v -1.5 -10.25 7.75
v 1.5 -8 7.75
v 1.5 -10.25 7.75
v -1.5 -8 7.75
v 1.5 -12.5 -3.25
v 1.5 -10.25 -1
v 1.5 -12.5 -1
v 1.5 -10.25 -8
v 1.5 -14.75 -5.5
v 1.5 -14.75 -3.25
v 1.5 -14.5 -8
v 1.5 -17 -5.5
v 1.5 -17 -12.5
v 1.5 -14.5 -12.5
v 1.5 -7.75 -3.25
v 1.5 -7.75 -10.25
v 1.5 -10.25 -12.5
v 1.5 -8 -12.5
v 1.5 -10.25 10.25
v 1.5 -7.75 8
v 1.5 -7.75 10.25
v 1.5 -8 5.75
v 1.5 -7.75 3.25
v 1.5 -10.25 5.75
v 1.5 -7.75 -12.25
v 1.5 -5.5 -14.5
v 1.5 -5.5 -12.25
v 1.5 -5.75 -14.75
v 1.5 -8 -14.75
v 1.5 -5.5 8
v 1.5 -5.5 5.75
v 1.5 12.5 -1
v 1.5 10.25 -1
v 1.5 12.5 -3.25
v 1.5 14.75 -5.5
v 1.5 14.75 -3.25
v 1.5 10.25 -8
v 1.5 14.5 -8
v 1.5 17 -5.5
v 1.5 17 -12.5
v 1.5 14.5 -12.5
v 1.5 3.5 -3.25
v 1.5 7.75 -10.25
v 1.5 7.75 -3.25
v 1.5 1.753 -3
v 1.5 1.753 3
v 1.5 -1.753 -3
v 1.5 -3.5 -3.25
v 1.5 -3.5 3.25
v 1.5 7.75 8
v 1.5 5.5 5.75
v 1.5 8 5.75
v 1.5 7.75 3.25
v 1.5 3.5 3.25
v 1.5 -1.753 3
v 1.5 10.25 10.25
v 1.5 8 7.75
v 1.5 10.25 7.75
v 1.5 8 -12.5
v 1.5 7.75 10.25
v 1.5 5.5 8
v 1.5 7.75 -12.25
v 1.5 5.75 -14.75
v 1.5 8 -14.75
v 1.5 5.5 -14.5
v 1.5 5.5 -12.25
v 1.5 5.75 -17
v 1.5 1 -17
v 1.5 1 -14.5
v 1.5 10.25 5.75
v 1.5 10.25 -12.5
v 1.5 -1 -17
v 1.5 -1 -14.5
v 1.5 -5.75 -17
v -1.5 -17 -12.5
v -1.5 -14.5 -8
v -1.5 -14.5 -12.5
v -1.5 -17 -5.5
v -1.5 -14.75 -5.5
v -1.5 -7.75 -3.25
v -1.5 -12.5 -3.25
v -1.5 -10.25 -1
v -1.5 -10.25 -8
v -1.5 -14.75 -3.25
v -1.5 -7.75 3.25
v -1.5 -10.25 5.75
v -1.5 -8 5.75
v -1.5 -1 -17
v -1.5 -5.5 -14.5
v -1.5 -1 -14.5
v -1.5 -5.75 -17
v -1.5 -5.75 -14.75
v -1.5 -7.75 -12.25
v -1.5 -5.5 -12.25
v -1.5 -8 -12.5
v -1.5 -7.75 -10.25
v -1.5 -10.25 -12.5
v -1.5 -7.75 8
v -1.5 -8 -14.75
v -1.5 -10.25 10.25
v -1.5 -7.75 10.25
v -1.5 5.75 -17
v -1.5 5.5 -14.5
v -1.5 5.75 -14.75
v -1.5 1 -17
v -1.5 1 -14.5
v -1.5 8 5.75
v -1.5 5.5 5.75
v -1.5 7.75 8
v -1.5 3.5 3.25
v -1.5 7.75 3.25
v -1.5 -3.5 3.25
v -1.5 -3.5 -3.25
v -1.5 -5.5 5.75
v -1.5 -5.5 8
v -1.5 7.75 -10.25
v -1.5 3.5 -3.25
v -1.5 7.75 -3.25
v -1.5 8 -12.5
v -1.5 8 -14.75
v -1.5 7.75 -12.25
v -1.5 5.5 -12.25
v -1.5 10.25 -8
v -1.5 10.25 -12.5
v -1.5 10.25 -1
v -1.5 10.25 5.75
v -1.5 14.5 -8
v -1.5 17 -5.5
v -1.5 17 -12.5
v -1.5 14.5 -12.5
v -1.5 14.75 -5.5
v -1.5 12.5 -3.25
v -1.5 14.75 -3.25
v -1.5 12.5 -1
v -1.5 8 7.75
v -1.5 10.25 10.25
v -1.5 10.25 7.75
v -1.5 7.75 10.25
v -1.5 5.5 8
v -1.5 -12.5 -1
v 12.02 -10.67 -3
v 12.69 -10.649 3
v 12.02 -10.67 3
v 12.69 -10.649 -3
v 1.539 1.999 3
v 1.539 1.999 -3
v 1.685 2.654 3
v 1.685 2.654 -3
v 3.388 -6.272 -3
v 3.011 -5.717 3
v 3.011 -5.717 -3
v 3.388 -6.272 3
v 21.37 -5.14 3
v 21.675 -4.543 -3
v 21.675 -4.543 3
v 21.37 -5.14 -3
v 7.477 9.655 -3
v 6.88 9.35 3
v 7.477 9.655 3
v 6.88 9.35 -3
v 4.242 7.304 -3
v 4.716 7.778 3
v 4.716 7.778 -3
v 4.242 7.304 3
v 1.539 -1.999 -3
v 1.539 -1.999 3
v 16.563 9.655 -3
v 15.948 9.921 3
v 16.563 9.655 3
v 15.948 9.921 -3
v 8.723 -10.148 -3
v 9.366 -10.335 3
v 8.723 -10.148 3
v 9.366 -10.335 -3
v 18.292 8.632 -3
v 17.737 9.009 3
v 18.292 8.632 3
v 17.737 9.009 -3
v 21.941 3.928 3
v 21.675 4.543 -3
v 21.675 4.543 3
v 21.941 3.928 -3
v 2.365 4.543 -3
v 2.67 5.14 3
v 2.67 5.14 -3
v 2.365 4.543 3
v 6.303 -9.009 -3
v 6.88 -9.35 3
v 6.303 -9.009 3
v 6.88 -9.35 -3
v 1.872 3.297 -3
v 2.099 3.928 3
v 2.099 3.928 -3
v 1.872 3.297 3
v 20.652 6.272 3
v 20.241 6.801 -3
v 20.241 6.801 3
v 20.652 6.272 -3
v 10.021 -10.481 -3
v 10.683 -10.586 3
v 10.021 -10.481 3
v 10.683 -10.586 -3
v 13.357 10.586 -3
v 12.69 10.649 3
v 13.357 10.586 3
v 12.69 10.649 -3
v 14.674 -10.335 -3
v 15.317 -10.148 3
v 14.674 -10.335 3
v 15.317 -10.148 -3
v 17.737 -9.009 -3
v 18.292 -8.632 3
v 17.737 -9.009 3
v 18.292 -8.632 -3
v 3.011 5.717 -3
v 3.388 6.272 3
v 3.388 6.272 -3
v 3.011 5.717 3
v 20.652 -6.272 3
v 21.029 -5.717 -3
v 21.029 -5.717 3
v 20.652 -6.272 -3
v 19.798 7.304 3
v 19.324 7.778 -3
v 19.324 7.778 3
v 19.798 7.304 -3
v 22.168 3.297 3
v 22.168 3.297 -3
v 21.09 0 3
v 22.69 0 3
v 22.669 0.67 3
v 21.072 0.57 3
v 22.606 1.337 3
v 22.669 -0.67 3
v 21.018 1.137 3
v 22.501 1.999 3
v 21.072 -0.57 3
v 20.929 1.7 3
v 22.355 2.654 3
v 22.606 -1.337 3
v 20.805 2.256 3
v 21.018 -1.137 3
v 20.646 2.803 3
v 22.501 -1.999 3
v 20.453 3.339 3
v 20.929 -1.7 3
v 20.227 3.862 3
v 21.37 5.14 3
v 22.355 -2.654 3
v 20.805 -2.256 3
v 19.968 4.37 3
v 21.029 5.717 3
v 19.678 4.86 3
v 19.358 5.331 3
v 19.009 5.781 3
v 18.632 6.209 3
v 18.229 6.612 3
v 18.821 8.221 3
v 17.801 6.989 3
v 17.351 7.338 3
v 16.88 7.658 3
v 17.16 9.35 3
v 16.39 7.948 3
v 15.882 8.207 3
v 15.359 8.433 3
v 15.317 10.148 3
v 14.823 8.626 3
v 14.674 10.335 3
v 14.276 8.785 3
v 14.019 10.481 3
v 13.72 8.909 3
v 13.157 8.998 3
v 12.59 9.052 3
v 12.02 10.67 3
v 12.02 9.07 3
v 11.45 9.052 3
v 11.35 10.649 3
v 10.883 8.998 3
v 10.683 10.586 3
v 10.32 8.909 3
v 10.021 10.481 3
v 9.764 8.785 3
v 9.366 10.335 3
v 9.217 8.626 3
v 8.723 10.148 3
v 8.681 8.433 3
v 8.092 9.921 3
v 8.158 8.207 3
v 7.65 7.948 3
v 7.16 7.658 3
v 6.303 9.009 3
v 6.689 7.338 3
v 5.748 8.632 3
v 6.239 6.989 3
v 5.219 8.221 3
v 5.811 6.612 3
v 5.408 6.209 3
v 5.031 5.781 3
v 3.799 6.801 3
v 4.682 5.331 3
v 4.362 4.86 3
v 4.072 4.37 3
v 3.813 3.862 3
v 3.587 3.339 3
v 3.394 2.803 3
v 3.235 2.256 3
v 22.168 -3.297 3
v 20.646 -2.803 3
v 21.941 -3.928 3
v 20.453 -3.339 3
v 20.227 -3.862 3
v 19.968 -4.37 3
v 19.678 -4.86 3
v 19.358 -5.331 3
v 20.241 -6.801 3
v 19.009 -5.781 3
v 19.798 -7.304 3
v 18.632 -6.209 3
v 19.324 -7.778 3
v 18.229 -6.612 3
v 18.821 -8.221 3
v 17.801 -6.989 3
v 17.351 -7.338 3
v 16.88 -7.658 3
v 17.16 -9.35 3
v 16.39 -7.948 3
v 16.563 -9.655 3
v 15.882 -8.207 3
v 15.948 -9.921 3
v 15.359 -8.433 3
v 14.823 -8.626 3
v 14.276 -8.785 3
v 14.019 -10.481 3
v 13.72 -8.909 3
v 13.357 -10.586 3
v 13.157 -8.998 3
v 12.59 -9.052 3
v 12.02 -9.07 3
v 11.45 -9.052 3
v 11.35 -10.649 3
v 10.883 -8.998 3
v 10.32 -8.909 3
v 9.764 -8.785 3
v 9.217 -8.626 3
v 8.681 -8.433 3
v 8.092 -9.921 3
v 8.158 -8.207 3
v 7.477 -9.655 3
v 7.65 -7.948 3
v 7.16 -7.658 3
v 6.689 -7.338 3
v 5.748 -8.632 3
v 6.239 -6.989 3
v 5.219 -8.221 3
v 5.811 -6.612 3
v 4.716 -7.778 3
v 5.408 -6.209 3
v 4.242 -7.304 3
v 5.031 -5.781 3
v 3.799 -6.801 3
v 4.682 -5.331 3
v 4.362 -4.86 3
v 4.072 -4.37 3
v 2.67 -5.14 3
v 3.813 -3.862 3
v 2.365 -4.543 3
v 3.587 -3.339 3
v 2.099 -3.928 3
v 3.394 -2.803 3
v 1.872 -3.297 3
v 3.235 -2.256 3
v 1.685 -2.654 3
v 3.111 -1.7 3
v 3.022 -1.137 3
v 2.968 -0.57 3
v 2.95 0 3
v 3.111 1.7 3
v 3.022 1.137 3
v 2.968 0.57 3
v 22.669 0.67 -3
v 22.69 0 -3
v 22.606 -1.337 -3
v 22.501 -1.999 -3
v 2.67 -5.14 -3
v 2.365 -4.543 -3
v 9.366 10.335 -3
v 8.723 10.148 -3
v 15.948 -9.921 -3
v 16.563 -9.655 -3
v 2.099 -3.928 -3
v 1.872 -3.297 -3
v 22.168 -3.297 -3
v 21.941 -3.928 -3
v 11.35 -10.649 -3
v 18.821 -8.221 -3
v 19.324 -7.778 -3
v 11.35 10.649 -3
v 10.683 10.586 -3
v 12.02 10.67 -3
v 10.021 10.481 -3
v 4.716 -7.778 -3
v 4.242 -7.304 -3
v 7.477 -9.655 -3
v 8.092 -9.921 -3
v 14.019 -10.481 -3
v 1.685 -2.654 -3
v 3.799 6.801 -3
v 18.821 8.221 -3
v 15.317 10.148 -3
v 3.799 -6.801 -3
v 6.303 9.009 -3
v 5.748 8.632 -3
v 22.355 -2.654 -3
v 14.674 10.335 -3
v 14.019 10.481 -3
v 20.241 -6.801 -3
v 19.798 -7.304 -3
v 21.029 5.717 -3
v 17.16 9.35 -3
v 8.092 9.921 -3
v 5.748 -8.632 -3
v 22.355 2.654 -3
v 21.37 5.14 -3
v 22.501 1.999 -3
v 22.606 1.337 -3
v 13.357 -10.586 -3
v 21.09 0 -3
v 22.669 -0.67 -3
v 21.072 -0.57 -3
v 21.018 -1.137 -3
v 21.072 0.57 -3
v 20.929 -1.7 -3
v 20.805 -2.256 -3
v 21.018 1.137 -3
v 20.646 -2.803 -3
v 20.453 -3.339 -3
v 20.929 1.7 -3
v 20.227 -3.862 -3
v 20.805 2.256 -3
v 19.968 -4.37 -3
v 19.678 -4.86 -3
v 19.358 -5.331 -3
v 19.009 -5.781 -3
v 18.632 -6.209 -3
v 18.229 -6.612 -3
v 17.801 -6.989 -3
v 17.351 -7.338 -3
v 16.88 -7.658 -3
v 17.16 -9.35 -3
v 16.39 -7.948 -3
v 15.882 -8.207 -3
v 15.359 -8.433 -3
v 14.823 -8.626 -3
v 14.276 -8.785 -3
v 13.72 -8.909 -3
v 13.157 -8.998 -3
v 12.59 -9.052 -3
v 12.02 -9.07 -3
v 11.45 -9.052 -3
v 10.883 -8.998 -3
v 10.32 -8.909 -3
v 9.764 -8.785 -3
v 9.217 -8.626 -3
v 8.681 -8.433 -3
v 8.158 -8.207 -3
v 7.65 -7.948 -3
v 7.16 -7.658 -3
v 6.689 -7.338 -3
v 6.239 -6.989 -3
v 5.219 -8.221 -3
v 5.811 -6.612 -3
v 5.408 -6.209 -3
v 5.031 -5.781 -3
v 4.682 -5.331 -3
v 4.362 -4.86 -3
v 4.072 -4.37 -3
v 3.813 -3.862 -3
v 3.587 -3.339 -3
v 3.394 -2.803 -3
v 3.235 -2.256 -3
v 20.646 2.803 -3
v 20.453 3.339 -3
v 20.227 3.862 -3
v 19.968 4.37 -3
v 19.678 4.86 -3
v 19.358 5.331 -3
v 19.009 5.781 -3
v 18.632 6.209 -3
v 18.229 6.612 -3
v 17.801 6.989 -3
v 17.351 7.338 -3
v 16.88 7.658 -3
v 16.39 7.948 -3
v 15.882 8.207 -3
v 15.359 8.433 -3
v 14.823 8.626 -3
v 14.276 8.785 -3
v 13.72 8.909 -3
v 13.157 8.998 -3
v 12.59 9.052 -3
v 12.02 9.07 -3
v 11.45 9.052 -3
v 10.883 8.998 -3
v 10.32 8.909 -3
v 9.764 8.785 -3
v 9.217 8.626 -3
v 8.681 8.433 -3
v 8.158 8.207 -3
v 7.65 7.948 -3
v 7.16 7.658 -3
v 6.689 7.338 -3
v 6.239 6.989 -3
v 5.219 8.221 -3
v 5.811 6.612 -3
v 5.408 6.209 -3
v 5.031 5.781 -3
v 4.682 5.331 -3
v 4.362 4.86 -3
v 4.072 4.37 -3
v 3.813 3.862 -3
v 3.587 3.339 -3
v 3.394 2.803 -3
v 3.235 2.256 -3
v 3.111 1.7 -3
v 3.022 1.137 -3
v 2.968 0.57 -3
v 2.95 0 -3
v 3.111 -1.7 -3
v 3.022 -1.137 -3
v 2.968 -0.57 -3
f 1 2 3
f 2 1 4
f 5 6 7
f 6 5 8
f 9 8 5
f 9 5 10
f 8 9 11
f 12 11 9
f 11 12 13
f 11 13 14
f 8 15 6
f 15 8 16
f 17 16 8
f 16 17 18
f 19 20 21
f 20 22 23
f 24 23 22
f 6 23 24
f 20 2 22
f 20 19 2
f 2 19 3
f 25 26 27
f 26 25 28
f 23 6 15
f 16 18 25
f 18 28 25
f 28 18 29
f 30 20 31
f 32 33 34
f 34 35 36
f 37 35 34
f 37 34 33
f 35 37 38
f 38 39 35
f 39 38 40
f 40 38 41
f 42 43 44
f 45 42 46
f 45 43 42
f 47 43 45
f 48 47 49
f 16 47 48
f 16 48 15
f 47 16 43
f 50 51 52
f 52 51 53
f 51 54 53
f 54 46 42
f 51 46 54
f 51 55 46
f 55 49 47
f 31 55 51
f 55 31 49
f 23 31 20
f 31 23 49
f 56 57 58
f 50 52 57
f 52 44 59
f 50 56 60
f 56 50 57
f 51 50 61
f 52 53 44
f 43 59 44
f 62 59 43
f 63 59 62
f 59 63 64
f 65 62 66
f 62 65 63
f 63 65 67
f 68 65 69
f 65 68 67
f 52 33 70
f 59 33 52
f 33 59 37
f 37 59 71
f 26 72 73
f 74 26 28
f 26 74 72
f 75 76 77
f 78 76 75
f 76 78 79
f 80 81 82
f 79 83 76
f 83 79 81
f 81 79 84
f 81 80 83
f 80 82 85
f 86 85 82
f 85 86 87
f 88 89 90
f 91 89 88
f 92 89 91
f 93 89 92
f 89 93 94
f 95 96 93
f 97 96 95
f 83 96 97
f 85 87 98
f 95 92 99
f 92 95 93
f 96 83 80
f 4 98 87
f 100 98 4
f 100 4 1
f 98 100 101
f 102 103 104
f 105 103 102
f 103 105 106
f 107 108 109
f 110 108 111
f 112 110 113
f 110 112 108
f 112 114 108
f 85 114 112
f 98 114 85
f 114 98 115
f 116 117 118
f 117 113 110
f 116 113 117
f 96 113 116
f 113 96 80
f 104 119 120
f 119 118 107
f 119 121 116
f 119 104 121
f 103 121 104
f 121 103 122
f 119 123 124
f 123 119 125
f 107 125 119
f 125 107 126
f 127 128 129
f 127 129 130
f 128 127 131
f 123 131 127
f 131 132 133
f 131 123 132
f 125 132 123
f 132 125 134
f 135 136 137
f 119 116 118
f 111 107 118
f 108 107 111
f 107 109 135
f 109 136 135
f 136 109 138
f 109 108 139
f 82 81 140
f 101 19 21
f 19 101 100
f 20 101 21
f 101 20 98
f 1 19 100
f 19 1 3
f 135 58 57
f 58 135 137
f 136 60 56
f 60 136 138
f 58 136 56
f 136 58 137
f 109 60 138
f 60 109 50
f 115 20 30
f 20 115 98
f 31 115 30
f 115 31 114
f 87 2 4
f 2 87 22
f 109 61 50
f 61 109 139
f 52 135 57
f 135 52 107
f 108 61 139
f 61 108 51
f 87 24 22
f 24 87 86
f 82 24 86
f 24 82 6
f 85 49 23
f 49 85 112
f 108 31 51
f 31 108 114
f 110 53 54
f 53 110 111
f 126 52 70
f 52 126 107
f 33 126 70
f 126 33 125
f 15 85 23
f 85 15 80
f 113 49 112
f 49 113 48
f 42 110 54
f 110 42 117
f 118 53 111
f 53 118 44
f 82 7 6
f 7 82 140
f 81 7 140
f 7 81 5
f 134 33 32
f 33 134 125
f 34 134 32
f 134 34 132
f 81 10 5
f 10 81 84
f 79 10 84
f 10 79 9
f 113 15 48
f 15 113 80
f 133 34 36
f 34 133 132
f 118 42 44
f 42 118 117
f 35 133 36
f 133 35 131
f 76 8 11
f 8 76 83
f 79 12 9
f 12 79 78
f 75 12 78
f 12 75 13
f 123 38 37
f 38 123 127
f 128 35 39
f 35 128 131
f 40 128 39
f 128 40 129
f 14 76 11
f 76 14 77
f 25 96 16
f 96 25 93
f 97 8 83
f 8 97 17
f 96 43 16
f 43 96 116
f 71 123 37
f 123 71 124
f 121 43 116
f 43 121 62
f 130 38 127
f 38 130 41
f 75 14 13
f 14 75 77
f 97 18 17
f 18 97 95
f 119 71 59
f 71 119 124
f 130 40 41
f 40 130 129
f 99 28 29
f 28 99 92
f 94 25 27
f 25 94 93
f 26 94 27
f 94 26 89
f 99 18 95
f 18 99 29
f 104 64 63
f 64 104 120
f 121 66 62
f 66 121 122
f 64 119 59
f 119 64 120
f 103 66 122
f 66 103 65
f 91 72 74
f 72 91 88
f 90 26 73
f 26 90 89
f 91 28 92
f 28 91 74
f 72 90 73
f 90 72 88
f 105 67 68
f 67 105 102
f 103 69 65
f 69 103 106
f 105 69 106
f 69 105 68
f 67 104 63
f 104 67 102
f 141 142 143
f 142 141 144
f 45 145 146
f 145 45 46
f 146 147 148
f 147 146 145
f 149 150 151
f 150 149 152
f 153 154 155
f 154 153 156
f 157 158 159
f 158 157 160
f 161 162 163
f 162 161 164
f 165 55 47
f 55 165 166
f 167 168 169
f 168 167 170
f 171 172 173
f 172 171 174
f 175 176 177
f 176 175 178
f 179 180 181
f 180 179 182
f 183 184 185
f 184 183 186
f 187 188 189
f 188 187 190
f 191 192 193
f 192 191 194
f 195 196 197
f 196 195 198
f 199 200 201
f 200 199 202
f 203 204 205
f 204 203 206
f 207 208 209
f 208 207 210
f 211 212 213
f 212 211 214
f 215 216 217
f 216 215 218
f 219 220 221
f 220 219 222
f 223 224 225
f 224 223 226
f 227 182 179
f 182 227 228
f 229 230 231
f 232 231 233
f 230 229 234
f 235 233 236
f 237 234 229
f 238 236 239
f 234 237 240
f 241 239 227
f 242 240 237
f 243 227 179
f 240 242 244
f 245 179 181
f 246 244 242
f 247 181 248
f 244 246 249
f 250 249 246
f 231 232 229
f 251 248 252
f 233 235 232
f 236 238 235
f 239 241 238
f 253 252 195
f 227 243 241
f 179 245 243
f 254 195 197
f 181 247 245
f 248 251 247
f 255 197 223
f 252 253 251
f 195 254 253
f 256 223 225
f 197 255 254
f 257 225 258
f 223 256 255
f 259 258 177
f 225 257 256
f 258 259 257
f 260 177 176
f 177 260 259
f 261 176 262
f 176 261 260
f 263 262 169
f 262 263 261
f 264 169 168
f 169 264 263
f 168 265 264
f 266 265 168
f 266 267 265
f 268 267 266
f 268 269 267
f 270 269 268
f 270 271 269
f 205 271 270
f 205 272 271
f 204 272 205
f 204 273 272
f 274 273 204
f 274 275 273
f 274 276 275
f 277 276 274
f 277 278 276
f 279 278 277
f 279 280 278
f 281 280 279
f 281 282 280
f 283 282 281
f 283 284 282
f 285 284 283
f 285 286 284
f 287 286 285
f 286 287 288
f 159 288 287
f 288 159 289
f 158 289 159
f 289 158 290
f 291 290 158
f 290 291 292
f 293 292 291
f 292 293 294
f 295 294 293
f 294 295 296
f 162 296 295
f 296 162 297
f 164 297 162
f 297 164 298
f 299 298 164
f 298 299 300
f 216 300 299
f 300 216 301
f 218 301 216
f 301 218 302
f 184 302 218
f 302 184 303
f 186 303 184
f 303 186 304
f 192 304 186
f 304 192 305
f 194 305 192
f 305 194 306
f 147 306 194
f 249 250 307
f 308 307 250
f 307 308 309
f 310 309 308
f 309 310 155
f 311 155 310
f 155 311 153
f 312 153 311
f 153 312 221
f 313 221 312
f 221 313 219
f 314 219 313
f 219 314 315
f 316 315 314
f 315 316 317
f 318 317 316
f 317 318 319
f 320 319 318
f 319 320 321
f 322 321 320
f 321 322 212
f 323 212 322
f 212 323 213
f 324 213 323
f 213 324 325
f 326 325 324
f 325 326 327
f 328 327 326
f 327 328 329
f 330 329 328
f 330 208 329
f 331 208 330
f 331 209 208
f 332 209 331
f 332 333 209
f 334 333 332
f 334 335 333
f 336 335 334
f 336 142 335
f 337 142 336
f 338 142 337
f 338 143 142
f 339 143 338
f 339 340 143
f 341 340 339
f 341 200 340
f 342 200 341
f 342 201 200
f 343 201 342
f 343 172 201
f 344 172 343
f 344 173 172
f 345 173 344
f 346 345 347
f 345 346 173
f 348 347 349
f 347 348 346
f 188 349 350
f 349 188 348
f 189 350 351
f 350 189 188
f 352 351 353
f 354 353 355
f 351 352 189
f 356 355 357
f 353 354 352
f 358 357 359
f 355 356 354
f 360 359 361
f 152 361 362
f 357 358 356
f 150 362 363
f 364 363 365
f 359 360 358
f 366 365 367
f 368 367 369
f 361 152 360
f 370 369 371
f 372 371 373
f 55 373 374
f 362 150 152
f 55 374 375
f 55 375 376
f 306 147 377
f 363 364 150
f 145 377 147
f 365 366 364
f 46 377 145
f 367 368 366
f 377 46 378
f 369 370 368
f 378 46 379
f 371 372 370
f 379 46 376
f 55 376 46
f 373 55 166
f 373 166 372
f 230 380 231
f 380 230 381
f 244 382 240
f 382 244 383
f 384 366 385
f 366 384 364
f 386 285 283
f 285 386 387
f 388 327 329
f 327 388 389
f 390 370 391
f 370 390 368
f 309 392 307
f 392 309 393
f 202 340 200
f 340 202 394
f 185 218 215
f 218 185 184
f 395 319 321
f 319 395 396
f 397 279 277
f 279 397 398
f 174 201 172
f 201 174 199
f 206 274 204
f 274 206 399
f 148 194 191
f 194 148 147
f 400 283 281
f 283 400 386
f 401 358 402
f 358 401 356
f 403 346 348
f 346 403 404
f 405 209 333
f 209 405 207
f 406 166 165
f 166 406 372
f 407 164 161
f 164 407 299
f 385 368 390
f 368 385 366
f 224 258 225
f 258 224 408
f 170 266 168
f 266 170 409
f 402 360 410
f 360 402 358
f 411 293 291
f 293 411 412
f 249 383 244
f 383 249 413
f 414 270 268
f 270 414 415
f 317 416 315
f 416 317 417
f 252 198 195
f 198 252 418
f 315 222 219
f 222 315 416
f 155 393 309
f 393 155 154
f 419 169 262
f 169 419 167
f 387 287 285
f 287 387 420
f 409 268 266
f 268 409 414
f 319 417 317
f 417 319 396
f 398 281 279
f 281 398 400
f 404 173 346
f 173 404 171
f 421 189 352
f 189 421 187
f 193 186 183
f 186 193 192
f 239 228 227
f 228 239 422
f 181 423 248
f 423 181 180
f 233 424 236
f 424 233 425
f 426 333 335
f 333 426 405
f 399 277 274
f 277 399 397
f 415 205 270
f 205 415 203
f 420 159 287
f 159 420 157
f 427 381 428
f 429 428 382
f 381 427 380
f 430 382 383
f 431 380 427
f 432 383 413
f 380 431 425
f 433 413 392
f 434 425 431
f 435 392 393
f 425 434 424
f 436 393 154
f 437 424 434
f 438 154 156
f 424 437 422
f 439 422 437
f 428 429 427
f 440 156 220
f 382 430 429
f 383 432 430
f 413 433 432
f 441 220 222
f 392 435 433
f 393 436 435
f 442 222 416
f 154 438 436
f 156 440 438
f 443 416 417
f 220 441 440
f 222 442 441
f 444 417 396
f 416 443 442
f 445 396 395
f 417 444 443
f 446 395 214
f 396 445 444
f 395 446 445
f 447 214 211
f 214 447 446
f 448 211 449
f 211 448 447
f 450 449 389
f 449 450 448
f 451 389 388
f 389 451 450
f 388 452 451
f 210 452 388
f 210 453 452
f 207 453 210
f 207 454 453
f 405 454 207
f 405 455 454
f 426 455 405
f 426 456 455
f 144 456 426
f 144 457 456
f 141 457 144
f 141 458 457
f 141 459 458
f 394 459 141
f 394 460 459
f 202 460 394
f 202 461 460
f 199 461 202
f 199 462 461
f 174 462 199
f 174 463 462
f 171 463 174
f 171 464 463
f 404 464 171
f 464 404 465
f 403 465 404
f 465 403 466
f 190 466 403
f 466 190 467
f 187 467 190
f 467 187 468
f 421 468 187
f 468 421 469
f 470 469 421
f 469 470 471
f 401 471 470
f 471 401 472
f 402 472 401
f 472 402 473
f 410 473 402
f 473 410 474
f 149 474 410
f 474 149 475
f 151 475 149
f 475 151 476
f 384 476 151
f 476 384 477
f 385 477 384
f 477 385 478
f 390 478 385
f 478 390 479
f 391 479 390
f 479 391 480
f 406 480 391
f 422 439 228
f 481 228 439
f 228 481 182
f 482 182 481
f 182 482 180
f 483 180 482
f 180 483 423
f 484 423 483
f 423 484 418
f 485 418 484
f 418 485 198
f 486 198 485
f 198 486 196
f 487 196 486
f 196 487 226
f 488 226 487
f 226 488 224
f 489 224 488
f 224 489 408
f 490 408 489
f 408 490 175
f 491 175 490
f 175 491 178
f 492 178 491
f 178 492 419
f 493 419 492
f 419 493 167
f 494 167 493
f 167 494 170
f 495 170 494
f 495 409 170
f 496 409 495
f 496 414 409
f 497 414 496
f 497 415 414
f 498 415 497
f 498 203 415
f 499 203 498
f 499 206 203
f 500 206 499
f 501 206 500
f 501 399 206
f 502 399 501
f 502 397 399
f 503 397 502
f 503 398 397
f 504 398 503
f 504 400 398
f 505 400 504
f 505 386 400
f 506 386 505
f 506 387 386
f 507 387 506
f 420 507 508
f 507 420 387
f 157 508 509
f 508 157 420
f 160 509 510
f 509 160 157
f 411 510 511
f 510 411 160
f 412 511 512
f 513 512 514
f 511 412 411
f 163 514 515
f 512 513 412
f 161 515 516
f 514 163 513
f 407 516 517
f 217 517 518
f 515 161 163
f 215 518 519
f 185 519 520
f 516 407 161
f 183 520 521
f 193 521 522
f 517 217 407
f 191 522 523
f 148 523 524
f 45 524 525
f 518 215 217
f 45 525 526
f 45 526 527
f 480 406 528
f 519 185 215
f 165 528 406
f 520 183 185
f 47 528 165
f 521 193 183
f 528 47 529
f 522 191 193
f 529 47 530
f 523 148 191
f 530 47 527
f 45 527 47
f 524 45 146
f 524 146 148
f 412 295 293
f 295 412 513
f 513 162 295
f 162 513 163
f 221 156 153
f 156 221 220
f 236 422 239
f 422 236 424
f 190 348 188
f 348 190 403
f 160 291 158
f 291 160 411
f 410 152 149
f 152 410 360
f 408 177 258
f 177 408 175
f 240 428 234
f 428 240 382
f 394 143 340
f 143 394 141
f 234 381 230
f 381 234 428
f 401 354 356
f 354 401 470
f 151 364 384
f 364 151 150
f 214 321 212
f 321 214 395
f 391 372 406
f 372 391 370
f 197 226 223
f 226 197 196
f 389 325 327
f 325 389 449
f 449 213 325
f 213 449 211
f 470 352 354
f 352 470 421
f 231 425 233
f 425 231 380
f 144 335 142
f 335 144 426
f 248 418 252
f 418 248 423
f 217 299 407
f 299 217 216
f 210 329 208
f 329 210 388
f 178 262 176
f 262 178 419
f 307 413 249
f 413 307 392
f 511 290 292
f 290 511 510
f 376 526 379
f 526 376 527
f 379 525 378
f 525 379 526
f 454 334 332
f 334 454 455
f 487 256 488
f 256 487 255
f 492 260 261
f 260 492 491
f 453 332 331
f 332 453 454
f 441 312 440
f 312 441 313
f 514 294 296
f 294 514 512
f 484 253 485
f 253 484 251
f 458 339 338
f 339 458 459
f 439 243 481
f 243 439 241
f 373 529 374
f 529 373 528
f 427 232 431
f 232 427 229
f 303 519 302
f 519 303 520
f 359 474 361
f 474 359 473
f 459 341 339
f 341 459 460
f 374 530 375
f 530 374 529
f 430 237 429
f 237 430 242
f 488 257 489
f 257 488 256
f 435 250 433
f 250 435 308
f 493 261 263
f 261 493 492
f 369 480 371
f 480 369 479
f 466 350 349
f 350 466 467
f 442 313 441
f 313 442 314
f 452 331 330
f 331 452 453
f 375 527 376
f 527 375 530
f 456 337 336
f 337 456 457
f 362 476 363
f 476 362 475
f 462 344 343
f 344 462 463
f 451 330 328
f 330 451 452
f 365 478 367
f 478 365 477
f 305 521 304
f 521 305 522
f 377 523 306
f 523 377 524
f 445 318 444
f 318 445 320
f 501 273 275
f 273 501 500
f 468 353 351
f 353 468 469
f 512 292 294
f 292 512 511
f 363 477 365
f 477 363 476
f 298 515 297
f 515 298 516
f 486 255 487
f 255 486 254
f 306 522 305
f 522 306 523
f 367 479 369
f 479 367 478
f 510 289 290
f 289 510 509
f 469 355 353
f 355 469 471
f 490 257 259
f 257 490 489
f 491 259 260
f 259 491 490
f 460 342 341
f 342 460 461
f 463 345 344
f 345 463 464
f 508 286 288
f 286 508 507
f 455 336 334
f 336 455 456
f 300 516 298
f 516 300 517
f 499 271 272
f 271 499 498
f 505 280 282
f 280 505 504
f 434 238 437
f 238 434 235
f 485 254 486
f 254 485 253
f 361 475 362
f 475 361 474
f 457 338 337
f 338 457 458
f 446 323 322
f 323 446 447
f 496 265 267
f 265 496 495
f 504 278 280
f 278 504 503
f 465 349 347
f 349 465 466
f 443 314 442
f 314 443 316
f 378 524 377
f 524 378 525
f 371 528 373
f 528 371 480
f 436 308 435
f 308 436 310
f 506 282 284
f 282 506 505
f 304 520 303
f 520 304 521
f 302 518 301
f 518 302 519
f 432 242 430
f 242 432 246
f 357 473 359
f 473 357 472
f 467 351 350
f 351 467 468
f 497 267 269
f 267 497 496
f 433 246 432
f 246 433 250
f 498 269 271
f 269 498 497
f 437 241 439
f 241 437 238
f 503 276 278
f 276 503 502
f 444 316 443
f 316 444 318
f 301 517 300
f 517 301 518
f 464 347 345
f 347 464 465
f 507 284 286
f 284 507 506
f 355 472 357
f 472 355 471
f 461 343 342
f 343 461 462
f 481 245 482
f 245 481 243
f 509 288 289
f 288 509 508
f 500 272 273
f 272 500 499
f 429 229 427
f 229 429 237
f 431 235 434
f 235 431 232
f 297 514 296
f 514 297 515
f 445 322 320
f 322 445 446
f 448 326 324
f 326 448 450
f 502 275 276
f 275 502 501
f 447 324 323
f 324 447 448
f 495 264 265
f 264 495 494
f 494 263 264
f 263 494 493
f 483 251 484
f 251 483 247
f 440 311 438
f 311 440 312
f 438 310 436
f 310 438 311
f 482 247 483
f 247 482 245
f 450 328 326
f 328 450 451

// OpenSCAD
//preview[view:west, tilt:side]
ring_thickness = 1.6; //[0.8:Thin,1.6:Normal,2.4:Thick]
ring_width = 6; //[6:12]
shape = 3; //[0:Custom,1:SpaceShip,2:Alien1,3:Alien2,4:Heart,5:Bow,6:Mushroom,7:Skull,8:WaitCursor,9:Pacman1,10:Pacman2]
//You can enter you own shape array here:
Custom = "[[0,0,0]]";
//Size of the pixel art object
objectSize = 50;
//Thickness of the pixel art object
objectThickness = 3;
gridRows = 2 * 10; //can't find a better to to get the customizer to ignore it 

//Pixel Width
unitWidth = objectSize / gridRows;


unitLength = unitWidth;
distance = unitWidth;

//(US Ring Sizes)
ring_size = 18.14; //[11.63:0,11.84:0.25,12.04:0.5,12.24:0.75,12.45:1,12.65:1.25,12.85:1.5,13.06:1.75,13.26:2,13.46:2.25,13.67:2.5,13.87:2.75,14.07:3,14.27:3.25,14.48:3.5,14.68:3.75,14.88:4,15.09:4.25,15.29:4.5,15.49:4.75,2215.9:5.25,16.1:5.5,16.31:5.75,16.51:6,16.71:6.25,16.92:6.5,17.12:6.75,17.32:7,17.53:7.25,17.73:7.5,17.93:7.75,18.14:8,18.34:8.25,18.54:8.5,18.75:8.75,18.95:9,19.15:9.25,19.35:9.5,19.56:9.75,19.76:10,19.96:10.25,20.17:10.5,20.37:10.75,20.57:11,20.78:11.25,20.98:11.5,21.18:11.75,21.39:12,21.59:12.25,21.79:12.5,22:12.75,22.2:13,22.4:13.25,22.61:13.5,22.81:13.75,23.01:14,23.22:14.25,23.42:14.5,23.62:14.75,23.83:15,24.03:15.25,24.23:15.5,24.43:15.75,24.64:16]


//Shapes

SpaceShip1 = [
    [-5, -3, 0],
    [-5, 3, 0],
    [-4, -2, 0],
    [-4, 2, 0],
    [-3, -1, 0],
    [-3, 0, 0],
    [-3, 1, 0],
    [-2, -2, 0],
    [-2, -1, 0],
    [-2, 0, 0],
    [-2, 1, 0],
    [-2, 2, 0],
    [-1, -3, 0],
    [-1, -2, 0],
    [-1, -1, 0],
    [-1, 0, 0],
    [-1, 1, 0],
    [-1, 2, 0],
    [-1, 3, 0],
    [0, -5, 0],
    [0, -4, 0],
    [0, -3, 0],
    [0, -1, 0],
    [0, 1, 0],
    [0, 3, 0],
    [0, 4, 0],
    [0, 5, 0],
    [1, -3, 0],
    [1, -2, 0],
    [1, -1, 0],
    [1, 0, 0],
    [1, 1, 0],
    [1, 2, 0],
    [1, 3, 0],
    [2, -2, 0],
    [2, -1, 0],
    [2, 0, 0],
    [2, 1, 0],
    [2, 2, 0],
    [3, -1, 0],
    [3, 0, 0],
    [3, 1, 0],
    [4, -2, 0],
    [4, 2, 0],
    [5, -3, 0],
    [5, 3, 0]
];

Alien1 = [
    [-6, -2, 0],
    [-6, -1, 0],
    [-6, 0, 0],
    [-6, 1, 0],
    [-6, 2, 0],
    [-5, -2, 0],
    [-5, 0, 0],
    [-5, 2, 0],
    [-4, -2, 0],
    [-4, -1, 0],
    [-4, 0, 0],
    [-4, 1, 0],
    [-4, 2, 0],
    [-3, 0, 0],
    [-2, -3, 0],
    [-2, -2, 0],
    [-2, -1, 0],
    [-2, 0, 0],
    [-2, 1, 0],
    [-2, 2, 0],
    [-2, 3, 0],
    [-1, -4, 0],
    [-1, -3, 0],
    [-1, -1, 0],
    [-1, 0, 0],
    [-1, 1, 0],
    [-1, 3, 0],
    [-1, 4, 0],
    [0, -4, 0],
    [0, -1, 0],
    [0, 0, 0],
    [0, 1, 0],
    [0, 4, 0],
    [1, -5, 0],
    [1, -4, 0],
    [1, -1, 0],
    [1, 0, 0],
    [1, 1, 0],
    [1, 4, 0],
    [1, 5, 0],
    [2, -5, 0],
    [2, -1, 0],
    [2, 0, 0],
    [2, 1, 0],
    [2, 5, 0],
    [3, -1, 0],
    [3, 0, 0],
    [3, 1, 0],
    [4, -3, 0],
    [4, -2, 0],
    [4, -1, 0],
    [4, 0, 0],
    [4, 1, 0],
    [4, 2, 0],
    [4, 3, 0],
    [5, -3, 0],
    [5, 3, 0],
    [6, -3, 0],
    [6, 3, 0],
    [7, -5, 0],
    [7, -4, 0],
    [7, -3, 0],
    [7, 3, 0],
    [7, 4, 0],
    [7, 5, 0]
];

Alien2 = [
    [-4, -4, 0],
    [-4, 4, 0],
    [-3, -3, 0],
    [-3, 3, 0],
    [-2, -4, 0],
    [-2, -3, 0],
    [-2, -2, 0],
    [-2, -1, 0],
    [-2, 0, 0],
    [-2, 1, 0],
    [-2, 2, 0],
    [-2, 3, 0],
    [-2, 4, 0],
    [-1, -4, 0],
    [-1, -1, 0],
    [-1, 0, 0],
    [-1, 1, 0],
    [-1, 4, 0],
    [0, -4, 0],
    [0, -1, 0],
    [0, 0, 0],
    [0, 1, 0],
    [0, 4, 0],
    [1, -5, 0],
    [1, -4, 0],
    [1, -1, 0],
    [1, 0, 0],
    [1, 1, 0],
    [1, 4, 0],
    [1, 5, 0],
    [2, -6, 0],
    [2, -5, 0],
    [2, -4, 0],
    [2, -3, 0],
    [2, -2, 0],
    [2, -1, 0],
    [2, 0, 0],
    [2, 1, 0],
    [2, 2, 0],
    [2, 3, 0],
    [2, 4, 0],
    [2, 5, 0],
    [2, 6, 0],
    [3, -7, 0],
    [3, -6, 0],
    [3, -5, 0],
    [3, -4, 0],
    [3, -3, 0],
    [3, -2, 0],
    [3, -1, 0],
    [3, 0, 0],
    [3, 1, 0],
    [3, 2, 0],
    [3, 3, 0],
    [3, 4, 0],
    [3, 5, 0],
    [3, 6, 0],
    [3, 7, 0],
    [4, -7, 0],
    [4, -4, 0],
    [4, -3, 0],
    [4, -2, 0],
    [4, -1, 0],
    [4, 0, 0],
    [4, 1, 0],
    [4, 2, 0],
    [4, 3, 0],
    [4, 4, 0],
    [4, 7, 0],
    [5, -7, 0],
    [5, -4, 0],
    [5, 4, 0],
    [5, 7, 0],
    [6, -3, 0],
    [6, 3, 0],
    [7, -2, 0],
    [7, -1, 0],
    [7, 1, 0],
    [7, 2, 0]
];


Heart = [
    [-2, -4, 0],
    [-2, -3, 0],
    [-2, -2, 0],
    [-2, 2, 0],
    [-2, 3, 0],
    [-2, 4, 0],
    [-1, -5, 0],
    [-1, -4, 0],
    [-1, -2, 0],
    [-1, -1, 0],
    [-1, 1, 0],
    [-1, 2, 0],
    [-1, 3, 0],
    [-1, 4, 0],
    [-1, 5, 0],
    [0, -5, 0],
    [0, -3, 0],
    [0, -2, 0],
    [0, -1, 0],
    [0, 0, 0],
    [0, 1, 0],
    [0, 2, 0],
    [0, 3, 0],
    [0, 4, 0],
    [0, 5, 0],
    [1, -5, 0],
    [1, -3, 0],
    [1, -2, 0],
    [1, -1, 0],
    [1, 0, 0],
    [1, 1, 0],
    [1, 2, 0],
    [1, 3, 0],
    [1, 4, 0],
    [1, 5, 0],
    [2, -5, 0],
    [2, -4, 0],
    [2, -3, 0],
    [2, -2, 0],
    [2, -1, 0],
    [2, 0, 0],
    [2, 1, 0],
    [2, 2, 0],
    [2, 3, 0],
    [2, 4, 0],
    [2, 5, 0],
    [3, -4, 0],
    [3, -3, 0],
    [3, -2, 0],
    [3, -1, 0],
    [3, 0, 0],
    [3, 1, 0],
    [3, 2, 0],
    [3, 3, 0],
    [3, 4, 0],
    [4, -3, 0],
    [4, -2, 0],
    [4, -1, 0],
    [4, 0, 0],
    [4, 1, 0],
    [4, 2, 0],
    [4, 3, 0],
    [5, -2, 0],
    [5, -1, 0],
    [5, 0, 0],
    [5, 1, 0],
    [5, 2, 0],
    [6, -1, 0],
    [6, 0, 0],
    [6, 1, 0],
    [7, 0, 0]
];

Mushroom1 = [
    [-9, -2, 0],
    [-9, -1, 0],
    [-9, 0, 0],
    [-9, 1, 0],
    [-9, 2, 0],
    [-9, 3, 0],
    [-8, -4, 0],
    [-8, -3, 0],
    [-8, -2, 0],
    [-8, -1, 0],
    [-8, 2, 0],
    [-8, 3, 0],
    [-8, 4, 0],
    [-8, 5, 0],
    [-7, -5, 0],
    [-7, -4, 0],
    [-7, -3, 0],
    [-7, -2, 0],
    [-7, -1, 0],
    [-7, 2, 0],
    [-7, 3, 0],
    [-7, 4, 0],
    [-7, 5, 0],
    [-7, 6, 0],
    [-6, -6, 0],
    [-6, -5, 0],
    [-6, -3, 0],
    [-6, -2, 0],
    [-6, 3, 0],
    [-6, 4, 0],
    [-6, 6, 0],
    [-6, 7, 0],
    [-5, -6, 0],
    [-5, 7, 0],
    [-4, -7, 0],
    [-4, -6, 0],
    [-4, -5, 0],
    [-4, 6, 0],
    [-4, 7, 0],
    [-4, 8, 0],
    [-3, -7, 0],
    [-3, -6, 0],
    [-3, -5, 0],
    [-3, -4, 0],
    [-3, 5, 0],
    [-3, 6, 0],
    [-3, 7, 0],
    [-3, 8, 0],
    [-2, -7, 0],
    [-2, -6, 0],
    [-2, -5, 0],
    [-2, -4, 0],
    [-2, -1, 0],
    [-2, 0, 0],
    [-2, 1, 0],
    [-2, 2, 0],
    [-2, 5, 0],
    [-2, 6, 0],
    [-2, 7, 0],
    [-2, 8, 0],
    [-1, -7, 0],
    [-1, -6, 0],
    [-1, -5, 0],
    [-1, -1, 0],
    [-1, 0, 0],
    [-1, 1, 0],
    [-1, 2, 0],
    [-1, 6, 0],
    [-1, 7, 0],
    [-1, 8, 0],
    [0, -7, 0],
    [0, -6, 0],
    [0, -5, 0],
    [0, -2, 0],
    [0, -1, 0],
    [0, 0, 0],
    [0, 1, 0],
    [0, 2, 0],
    [0, 3, 0],
    [0, 6, 0],
    [0, 7, 0],
    [0, 8, 0],
    [1, -7, 0],
    [1, -1, 0],
    [1, 0, 0],
    [1, 1, 0],
    [1, 2, 0],
    [1, 8, 0],
    [2, -7, 0],
    [2, -4, 0],
    [2, -3, 0],
    [2, -2, 0],
    [2, -1, 0],
    [2, 0, 0],
    [2, 1, 0],
    [2, 2, 0],
    [2, 3, 0],
    [2, 4, 0],
    [2, 5, 0],
    [2, 8, 0],
    [3, -7, 0],
    [3, -4, 0],
    [3, -1, 0],
    [3, 2, 0],
    [3, 5, 0],
    [3, 8, 0],
    [4, -7, 0],
    [4, -6, 0],
    [4, -5, 0],
    [4, -1, 0],
    [4, 2, 0],
    [4, 6, 0],
    [4, 7, 0],
    [4, 8, 0],
    [5, -6, 0],
    [5, -5, 0],
    [5, 6, 0],
    [5, 7, 0],
    [6, -5, 0],
    [6, 6, 0],
    [7, -5, 0],
    [7, -4, 0],
    [7, 5, 0],
    [7, 6, 0],
    [8, -4, 0],
    [8, -3, 0],
    [8, -2, 0],
    [8, -1, 0],
    [8, 0, 0],
    [8, 1, 0],
    [8, 2, 0],
    [8, 3, 0],
    [8, 4, 0],
    [8, 5, 0]
];;

Mushroom2 = [
    [-7, -2, 0],
    [-7, -1, 0],
    [-7, 0, 0],
    [-7, 1, 0],
    [-7, 2, 0],
    [-7, 3, 0],
    [-6, -4, 0],
    [-6, -3, 0],
    [-6, 4, 0],
    [-6, 5, 0],
    [-5, -5, 0],
    [-5, -4, 0],
    [-5, -3, 0],
    [-5, 4, 0],
    [-5, 5, 0],
    [-5, 6, 0],
    [-4, -6, 0],
    [-4, -5, 0],
    [-4, 6, 0],
    [-4, 7, 0],
    [-3, -6, 0],
    [-3, -5, 0],
    [-3, 6, 0],
    [-3, 7, 0],
    [-2, -7, 0],
    [-2, -6, 0],
    [-2, -5, 0],
    [-2, -4, 0],
    [-2, -1, 0],
    [-2, 0, 0],
    [-2, 1, 0],
    [-2, 2, 0],
    [-2, 5, 0],
    [-2, 6, 0],
    [-2, 7, 0],
    [-2, 8, 0],
    [-1, -7, 0],
    [-1, -6, 0],
    [-1, -5, 0],
    [-1, -4, 0],
    [-1, -2, 0],
    [-1, -1, 0],
    [-1, 0, 0],
    [-1, 1, 0],
    [-1, 2, 0],
    [-1, 3, 0],
    [-1, 5, 0],
    [-1, 6, 0],
    [-1, 7, 0],
    [-1, 8, 0],
    [0, -7, 0],
    [0, -2, 0],
    [0, -1, 0],
    [0, 0, 0],
    [0, 1, 0],
    [0, 2, 0],
    [0, 3, 0],
    [0, 6, 0],
    [0, 7, 0],
    [0, 8, 0],
    [1, -7, 0],
    [1, -1, 0],
    [1, 0, 0],
    [1, 1, 0],
    [1, 2, 0],
    [1, 8, 0],
    [2, -7, 0],
    [2, -4, 0],
    [2, -3, 0],
    [2, -2, 0],
    [2, -1, 0],
    [2, 0, 0],
    [2, 1, 0],
    [2, 2, 0],
    [2, 3, 0],
    [2, 4, 0],
    [2, 5, 0],
    [2, 8, 0],
    [3, -7, 0],
    [3, -4, 0],
    [3, -1, 0],
    [3, 2, 0],
    [3, 5, 0],
    [3, 8, 0],
    [4, -7, 0],
    [4, -6, 0],
    [4, -5, 0],
    [4, -4, 0],
    [4, -1, 0],
    [4, 2, 0],
    [4, 5, 0],
    [4, 6, 0],
    [4, 7, 0],
    [4, 8, 0],
    [5, -6, 0],
    [5, -5, 0],
    [5, 6, 0],
    [5, 7, 0],
    [6, -5, 0],
    [6, 6, 0],
    [7, -5, 0],
    [7, -4, 0],
    [7, 5, 0],
    [7, 6, 0],
    [8, -4, 0],
    [8, -3, 0],
    [8, -2, 0],
    [8, -1, 0],
    [8, 0, 0],
    [8, 1, 0],
    [8, 2, 0],
    [8, 3, 0],
    [8, 4, 0],
    [8, 5, 0]
];


Skull1 = [
    [-4, -3, 0],
    [-4, -2, 0],
    [-4, -1, 0],
    [-4, 0, 0],
    [-4, 1, 0],
    [-4, 2, 0],
    [-4, 3, 0],
    [-3, -4, 0],
    [-3, -3, 0],
    [-3, -2, 0],
    [-3, -1, 0],
    [-3, 0, 0],
    [-3, 1, 0],
    [-3, 2, 0],
    [-3, 3, 0],
    [-3, 4, 0],
    [-2, -5, 0],
    [-2, -4, 0],
    [-2, -3, 0],
    [-2, -2, 0],
    [-2, -1, 0],
    [-2, 0, 0],
    [-2, 1, 0],
    [-2, 2, 0],
    [-2, 3, 0],
    [-2, 4, 0],
    [-2, 5, 0],
    [-1, -5, 0],
    [-1, -4, 0],
    [-1, 0, 0],
    [-1, 4, 0],
    [-1, 5, 0],
    [0, -5, 0],
    [0, -4, 0],
    [0, 0, 0],
    [0, 4, 0],
    [0, 5, 0],
    [1, -5, 0],
    [1, -4, 0],
    [1, 0, 0],
    [1, 4, 0],
    [1, 5, 0],
    [2, -5, 0],
    [2, -4, 0],
    [2, -3, 0],
    [2, -2, 0],
    [2, -1, 0],
    [2, 0, 0],
    [2, 1, 0],
    [2, 2, 0],
    [2, 3, 0],
    [2, 4, 0],
    [2, 5, 0],
    [3, -4, 0],
    [3, -3, 0],
    [3, -1, 0],
    [3, 1, 0],
    [3, 3, 0],
    [3, 4, 0],
    [4, -3, 0],
    [4, -1, 0],
    [4, 1, 0],
    [4, 3, 0],
    [5, -3, 0],
    [5, -1, 0],
    [5, 1, 0],
    [5, 3, 0],
    [6, -3, 0],
    [6, -1, 0],
    [6, 1, 0],
    [6, 3, 0],
    [7, -3, 0],
    [7, -2, 0],
    [7, -1, 0],
    [7, 0, 0],
    [7, 1, 0],
    [7, 2, 0],
    [7, 3, 0]
];


Wait1 = [
    [-10, -5, 0],
    [-10, -4, 0],
    [-10, -3, 0],
    [-10, -2, 0],
    [-10, -1, 0],
    [-10, 0, 0],
    [-10, 1, 0],
    [-10, 2, 0],
    [-10, 3, 0],
    [-10, 4, 0],
    [-10, 5, 0],
    [-9, -5, 0],
    [-9, 5, 0],
    [-8, -5, 0],
    [-8, -4, 0],
    [-8, -3, 0],
    [-8, -2, 0],
    [-8, -1, 0],
    [-8, 0, 0],
    [-8, 1, 0],
    [-8, 2, 0],
    [-8, 3, 0],
    [-8, 4, 0],
    [-8, 5, 0],
    [-7, -4, 0],
    [-7, 4, 0],
    [-6, -4, 0],
    [-6, -2, 0],
    [-6, 0, 0],
    [-6, 2, 0],
    [-6, 4, 0],
    [-5, -4, 0],
    [-5, -1, 0],
    [-5, 1, 0],
    [-5, 4, 0],
    [-4, -4, 0],
    [-4, 0, 0],
    [-4, 4, 0],
    [-3, -4, 0],
    [-3, 4, 0],
    [-2, -3, 0],
    [-2, -2, 0],
    [-2, 0, 0],
    [-2, 2, 0],
    [-2, 3, 0],
    [-1, -2, 0],
    [-1, -1, 0],
    [-1, 1, 0],
    [-1, 2, 0],
    [0, -1, 0],
    [0, 1, 0],
    [1, -2, 0],
    [1, -1, 0],
    [1, 1, 0],
    [1, 2, 0],
    [2, -3, 0],
    [2, -2, 0],
    [2, 0, 0],
    [2, 2, 0],
    [2, 3, 0],
    [3, -4, 0],
    [3, 4, 0],
    [4, -4, 0],
    [4, 0, 0],
    [4, 4, 0],
    [5, -4, 0],
    [5, -1, 0],
    [5, 1, 0],
    [5, 4, 0],
    [6, -4, 0],
    [6, -2, 0],
    [6, 0, 0],
    [6, 2, 0],
    [6, 4, 0],
    [7, -5, 0],
    [7, -4, 0],
    [7, -3, 0],
    [7, -2, 0],
    [7, -1, 0],
    [7, 0, 0],
    [7, 1, 0],
    [7, 2, 0],
    [7, 3, 0],
    [7, 4, 0],
    [7, 5, 0],
    [8, -5, 0],
    [8, 5, 0],
    [9, -5, 0],
    [9, -4, 0],
    [9, -3, 0],
    [9, -2, 0],
    [9, -1, 0],
    [9, 0, 0],
    [9, 1, 0],
    [9, 2, 0],
    [9, 3, 0],
    [9, 4, 0],
    [9, 5, 0]
];

Pacman1 = [
    [-6, -2, 0],
    [-6, -1, 0],
    [-6, 0, 0],
    [-6, 1, 0],
    [-6, 2, 0],
    [-5, -4, 0],
    [-5, -3, 0],
    [-5, -2, 0],
    [-5, -1, 0],
    [-5, 0, 0],
    [-5, 1, 0],
    [-5, 2, 0],
    [-5, 3, 0],
    [-5, 4, 0],
    [-4, -5, 0],
    [-4, -4, 0],
    [-4, -3, 0],
    [-4, -2, 0],
    [-4, -1, 0],
    [-4, 0, 0],
    [-4, 1, 0],
    [-4, 2, 0],
    [-4, 3, 0],
    [-4, 4, 0],
    [-4, 5, 0],
    [-3, -5, 0],
    [-3, -4, 0],
    [-3, -3, 0],
    [-3, -2, 0],
    [-3, -1, 0],
    [-3, 0, 0],
    [-3, 1, 0],
    [-3, 2, 0],
    [-3, 3, 0],
    [-3, 4, 0],
    [-3, 5, 0],
    [-2, -6, 0],
    [-2, -5, 0],
    [-2, -4, 0],
    [-2, -3, 0],
    [-2, -2, 0],
    [-2, -1, 0],
    [-2, 0, 0],
    [-2, 1, 0],
    [-2, 2, 0],
    [-2, 3, 0],
    [-1, -6, 0],
    [-1, -5, 0],
    [-1, -4, 0],
    [-1, -3, 0],
    [-1, -2, 0],
    [-1, -1, 0],
    [-1, 0, 0],
    [0, -6, 0],
    [0, -5, 0],
    [0, -4, 0],
    [0, -3, 0],
    [0, -2, 0],
    [1, -6, 0],
    [1, -5, 0],
    [1, -4, 0],
    [1, -3, 0],
    [1, -2, 0],
    [1, -1, 0],
    [1, 0, 0],
    [2, -6, 0],
    [2, -5, 0],
    [2, -4, 0],
    [2, -3, 0],
    [2, -2, 0],
    [2, -1, 0],
    [2, 0, 0],
    [2, 1, 0],
    [2, 2, 0],
    [2, 3, 0],
    [3, -5, 0],
    [3, -4, 0],
    [3, -3, 0],
    [3, -2, 0],
    [3, -1, 0],
    [3, 0, 0],
    [3, 1, 0],
    [3, 2, 0],
    [3, 3, 0],
    [3, 4, 0],
    [3, 5, 0],
    [4, -5, 0],
    [4, -4, 0],
    [4, -3, 0],
    [4, -2, 0],
    [4, -1, 0],
    [4, 0, 0],
    [4, 1, 0],
    [4, 2, 0],
    [4, 3, 0],
    [4, 4, 0],
    [4, 5, 0],
    [5, -4, 0],
    [5, -3, 0],
    [5, -2, 0],
    [5, -1, 0],
    [5, 0, 0],
    [5, 1, 0],
    [5, 2, 0],
    [5, 3, 0],
    [5, 4, 0],
    [6, -2, 0],
    [6, -1, 0],
    [6, 0, 0],
    [6, 1, 0],
    [6, 2, 0]
];

Pacman2 = [
    [-10, -3, 0],
    [-10, -2, 0],
    [-10, -1, 0],
    [-10, 0, 0],
    [-10, 1, 0],
    [-10, 2, 0],
    [-10, 3, 0],
    [-9, -6, 0],
    [-9, -5, 0],
    [-9, -4, 0],
    [-9, -3, 0],
    [-9, -2, 0],
    [-9, -1, 0],
    [-9, 0, 0],
    [-9, 1, 0],
    [-9, 2, 0],
    [-9, 3, 0],
    [-9, 4, 0],
    [-9, 5, 0],
    [-9, 6, 0],
    [-8, -6, 0],
    [-8, -5, 0],
    [-8, -4, 0],
    [-8, -3, 0],
    [-8, -2, 0],
    [-8, -1, 0],
    [-8, 0, 0],
    [-8, 1, 0],
    [-8, 2, 0],
    [-8, 3, 0],
    [-8, 4, 0],
    [-8, 5, 0],
    [-8, 6, 0],
    [-7, -7, 0],
    [-7, -6, 0],
    [-7, -5, 0],
    [-7, -4, 0],
    [-7, -3, 0],
    [-7, -2, 0],
    [-7, -1, 0],
    [-7, 0, 0],
    [-7, 1, 0],
    [-7, 2, 0],
    [-7, 3, 0],
    [-7, 4, 0],
    [-7, 5, 0],
    [-7, 6, 0],
    [-7, 7, 0],
    [-6, -8, 0],
    [-6, -7, 0],
    [-6, -6, 0],
    [-6, -5, 0],
    [-6, -4, 0],
    [-6, -3, 0],
    [-6, -2, 0],
    [-6, -1, 0],
    [-6, 0, 0],
    [-6, 1, 0],
    [-6, 2, 0],
    [-6, 3, 0],
    [-6, 4, 0],
    [-6, 5, 0],
    [-6, 6, 0],
    [-6, 7, 0],
    [-6, 8, 0],
    [-5, -8, 0],
    [-5, -7, 0],
    [-5, -6, 0],
    [-5, -5, 0],
    [-5, -4, 0],
    [-5, -3, 0],
    [-5, -2, 0],
    [-5, -1, 0],
    [-5, 0, 0],
    [-5, 1, 0],
    [-5, 2, 0],
    [-5, 3, 0],
    [-5, 4, 0],
    [-5, 5, 0],
    [-5, 6, 0],
    [-5, 7, 0],
    [-5, 8, 0],
    [-4, -8, 0],
    [-4, -7, 0],
    [-4, -6, 0],
    [-4, -2, 0],
    [-4, -1, 0],
    [-4, 0, 0],
    [-4, 1, 0],
    [-4, 2, 0],
    [-4, 6, 0],
    [-4, 7, 0],
    [-4, 8, 0],
    [-3, -9, 0],
    [-3, -8, 0],
    [-3, -7, 0],
    [-3, -1, 0],
    [-3, 0, 0],
    [-3, 1, 0],
    [-3, 7, 0],
    [-3, 8, 0],
    [-2, -9, 0],
    [-2, -8, 0],
    [-2, -7, 0],
    [-2, -1, 0],
    [-2, 0, 0],
    [-2, 1, 0],
    [-2, 7, 0],
    [-2, 8, 0],
    [-2, 9, 0],
    [-1, -9, 0],
    [-1, -8, 0],
    [-1, -7, 0],
    [-1, -5, 0],
    [-1, -4, 0],
    [-1, -3, 0],
    [-1, -1, 0],
    [-1, 0, 0],
    [-1, 1, 0],
    [-1, 3, 0],
    [-1, 4, 0],
    [-1, 5, 0],
    [-1, 7, 0],
    [-1, 8, 0],
    [-1, 9, 0],
    [0, -9, 0],
    [0, -8, 0],
    [0, -7, 0],
    [0, -5, 0],
    [0, -4, 0],
    [0, -3, 0],
    [0, -1, 0],
    [0, 0, 0],
    [0, 1, 0],
    [0, 3, 0],
    [0, 4, 0],
    [0, 5, 0],
    [0, 7, 0],
    [0, 8, 0],
    [0, 9, 0],
    [1, -9, 0],
    [1, -8, 0],
    [1, -7, 0],
    [1, -5, 0],
    [1, -4, 0],
    [1, -3, 0],
    [1, -1, 0],
    [1, 0, 0],
    [1, 1, 0],
    [1, 3, 0],
    [1, 4, 0],
    [1, 5, 0],
    [1, 7, 0],
    [1, 8, 0],
    [1, 9, 0],
    [2, -9, 0],
    [2, -8, 0],
    [2, -7, 0],
    [2, -6, 0],
    [2, -5, 0],
    [2, -4, 0],
    [2, -3, 0],
    [2, -2, 0],
    [2, -1, 0],
    [2, 0, 0],
    [2, 1, 0],
    [2, 2, 0],
    [2, 3, 0],
    [2, 4, 0],
    [2, 5, 0],
    [2, 6, 0],
    [2, 7, 0],
    [2, 8, 0],
    [2, 9, 0],
    [3, -9, 0],
    [3, -8, 0],
    [3, -7, 0],
    [3, -6, 0],
    [3, -5, 0],
    [3, -4, 0],
    [3, -3, 0],
    [3, -2, 0],
    [3, -1, 0],
    [3, 0, 0],
    [3, 1, 0],
    [3, 2, 0],
    [3, 3, 0],
    [3, 4, 0],
    [3, 5, 0],
    [3, 6, 0],
    [3, 7, 0],
    [3, 8, 0],
    [3, 9, 0],
    [4, -9, 0],
    [4, -8, 0],
    [4, -7, 0],
    [4, -6, 0],
    [4, -5, 0],
    [4, -4, 0],
    [4, -3, 0],
    [4, -2, 0],
    [4, -1, 0],
    [4, 0, 0],
    [4, 1, 0],
    [4, 2, 0],
    [4, 3, 0],
    [4, 4, 0],
    [4, 5, 0],
    [4, 6, 0],
    [4, 7, 0],
    [4, 8, 0],
    [4, 9, 0],
    [5, -9, 0],
    [5, -8, 0],
    [5, -7, 0],
    [5, -6, 0],
    [5, -5, 0],
    [5, -4, 0],
    [5, -3, 0],
    [5, -2, 0],
    [5, -1, 0],
    [5, 0, 0],
    [5, 1, 0],
    [5, 2, 0],
    [5, 3, 0],
    [5, 4, 0],
    [5, 5, 0],
    [5, 6, 0],
    [5, 7, 0],
    [5, 8, 0],
    [5, 9, 0],
    [6, -9, 0],
    [6, -8, 0],
    [6, -7, 0],
    [6, -6, 0],
    [6, -5, 0],
    [6, -4, 0],
    [6, -3, 0],
    [6, -2, 0],
    [6, -1, 0],
    [6, 0, 0],
    [6, 1, 0],
    [6, 2, 0],
    [6, 3, 0],
    [6, 4, 0],
    [6, 5, 0],
    [6, 6, 0],
    [6, 7, 0],
    [6, 8, 0],
    [6, 9, 0],
    [7, -9, 0],
    [7, -8, 0],
    [7, -7, 0],
    [7, -6, 0],
    [7, -5, 0],
    [7, -4, 0],
    [7, -3, 0],
    [7, -2, 0],
    [7, -1, 0],
    [7, 0, 0],
    [7, 1, 0],
    [7, 2, 0],
    [7, 3, 0],
    [7, 4, 0],
    [7, 5, 0],
    [7, 6, 0],
    [7, 7, 0],
    [7, 8, 0],
    [7, 9, 0],
    [8, -9, 0],
    [8, -8, 0],
    [8, -7, 0],
    [8, -6, 0],
    [8, -5, 0],
    [8, -2, 0],
    [8, -1, 0],
    [8, 0, 0],
    [8, 1, 0],
    [8, 2, 0],
    [8, 5, 0],
    [8, 6, 0],
    [8, 7, 0],
    [8, 8, 0],
    [8, 9, 0],
    [9, -8, 0],
    [9, -7, 0],
    [9, -6, 0],
    [9, 0, 0],
    [9, 6, 0],
    [9, 7, 0],
    [9, 8, 0]
];

Bow1 = [
    [-5, -7, 0],
    [-5, -6, 0],
    [-5, 6, 0],
    [-5, 7, 0],
    [-4, -8, 0],
    [-4, -5, 0],
    [-4, -4, 0],
    [-4, 4, 0],
    [-4, 5, 0],
    [-4, 8, 0],
    [-3, -8, 0],
    [-3, -3, 0],
    [-3, 3, 0],
    [-3, 8, 0],
    [-2, -9, 0],
    [-2, -2, 0],
    [-2, -1, 0],
    [-2, 0, 0],
    [-2, 1, 0],
    [-2, 2, 0],
    [-2, 9, 0],
    [-1, -9, 0],
    [-1, -4, 0],
    [-1, -2, 0],
    [-1, -1, 0],
    [-1, 0, 0],
    [-1, 1, 0],
    [-1, 2, 0],
    [-1, 4, 0],
    [-1, 9, 0],
    [0, -9, 0],
    [0, -3, 0],
    [0, -2, 0],
    [0, -1, 0],
    [0, 0, 0],
    [0, 1, 0],
    [0, 2, 0],
    [0, 3, 0],
    [0, 9, 0],
    [1, -9, 0],
    [1, -4, 0],
    [1, -2, 0],
    [1, -1, 0],
    [1, 0, 0],
    [1, 1, 0],
    [1, 2, 0],
    [1, 4, 0],
    [1, 9, 0],
    [2, -9, 0],
    [2, -2, 0],
    [2, -1, 0],
    [2, 0, 0],
    [2, 1, 0],
    [2, 2, 0],
    [2, 9, 0],
    [3, -8, 0],
    [3, -3, 0],
    [3, 3, 0],
    [3, 8, 0],
    [4, -8, 0],
    [4, -5, 0],
    [4, -4, 0],
    [4, 4, 0],
    [4, 5, 0],
    [4, 8, 0],
    [5, -7, 0],
    [5, -6, 0],
    [5, 6, 0],
    [5, 7, 0]
];;


union() {
	rotate([0,90,0])  //might need to reset for printing
	{
    	drawshape();
    	drawring();
	}
}

module drawshape() {
    //Draw the shape we chose
    if (shape == 1) {
        pixel(SpaceShip1);
    } else if (shape == 2) {
        color("Blue")
        pixel(Alien1);
    } else if (shape == 3) {
        color("Blue")
        pixel(Alien2);
    } else if (shape == 4) {
        color("red")
        pixel(Heart);
    } else if (shape == 5) {
        color("red")
        pixel(Bow1);
    } else if (shape == 6) {
        color("green")
        pixel(Mushroom2);
    } else if (shape == 7) {
        color("black")
        pixel(Skull1);
    } else if (shape == 8) {
        color("black")
        pixel(Wait1);
    } else if (shape == 9) {
        pixel(Pacman1);
    } else if (shape == 10) {
        color("red")
        pixel(Pacman2);
    } else if (shape == 0) {
        color("red")
        pixel(Custom);
    }
}

module drawring() {
    //Draw the ring
    rotate(a = [0, 90, 0]) {
        translate([-(inner_radius + ring_thickness + (objectThickness / 2 * 0.9)), 0, 0]) {
            color("Silver")
            ring();
        }
    }
}
//Draw the pixel shape
module pixel(num) {
    union() {
        for (i = num) {
            translate(i * distance * 0.9) //the 0.9 guarantees some overlap
            cube([unitLength, unitWidth, objectThickness], center = true);
        }
    }
}


inner_diameter = ring_size;
inner_radius = inner_diameter / 2;

module ring() {
    if (ring_thickness == .8) {
        difference() {

            difference() {

                translate([0, 0, 0])
                cylinder(r = inner_radius + ring_thickness, h = ring_width, $fn = 100, center = true);
            }

            cylinder(r = inner_radius, h = ring_width + 1, $fn = 100, center = true);
        }
    } else {
        difference() {

            difference() {

                translate([0, 0, 0])
                cylinder(r = inner_radius + ring_thickness, h = ring_width, $fn = 100, center = true);
            }

            cylinder(r = inner_radius, h = ring_width + 1, $fn = 100, center = true);
        }
    }
}
